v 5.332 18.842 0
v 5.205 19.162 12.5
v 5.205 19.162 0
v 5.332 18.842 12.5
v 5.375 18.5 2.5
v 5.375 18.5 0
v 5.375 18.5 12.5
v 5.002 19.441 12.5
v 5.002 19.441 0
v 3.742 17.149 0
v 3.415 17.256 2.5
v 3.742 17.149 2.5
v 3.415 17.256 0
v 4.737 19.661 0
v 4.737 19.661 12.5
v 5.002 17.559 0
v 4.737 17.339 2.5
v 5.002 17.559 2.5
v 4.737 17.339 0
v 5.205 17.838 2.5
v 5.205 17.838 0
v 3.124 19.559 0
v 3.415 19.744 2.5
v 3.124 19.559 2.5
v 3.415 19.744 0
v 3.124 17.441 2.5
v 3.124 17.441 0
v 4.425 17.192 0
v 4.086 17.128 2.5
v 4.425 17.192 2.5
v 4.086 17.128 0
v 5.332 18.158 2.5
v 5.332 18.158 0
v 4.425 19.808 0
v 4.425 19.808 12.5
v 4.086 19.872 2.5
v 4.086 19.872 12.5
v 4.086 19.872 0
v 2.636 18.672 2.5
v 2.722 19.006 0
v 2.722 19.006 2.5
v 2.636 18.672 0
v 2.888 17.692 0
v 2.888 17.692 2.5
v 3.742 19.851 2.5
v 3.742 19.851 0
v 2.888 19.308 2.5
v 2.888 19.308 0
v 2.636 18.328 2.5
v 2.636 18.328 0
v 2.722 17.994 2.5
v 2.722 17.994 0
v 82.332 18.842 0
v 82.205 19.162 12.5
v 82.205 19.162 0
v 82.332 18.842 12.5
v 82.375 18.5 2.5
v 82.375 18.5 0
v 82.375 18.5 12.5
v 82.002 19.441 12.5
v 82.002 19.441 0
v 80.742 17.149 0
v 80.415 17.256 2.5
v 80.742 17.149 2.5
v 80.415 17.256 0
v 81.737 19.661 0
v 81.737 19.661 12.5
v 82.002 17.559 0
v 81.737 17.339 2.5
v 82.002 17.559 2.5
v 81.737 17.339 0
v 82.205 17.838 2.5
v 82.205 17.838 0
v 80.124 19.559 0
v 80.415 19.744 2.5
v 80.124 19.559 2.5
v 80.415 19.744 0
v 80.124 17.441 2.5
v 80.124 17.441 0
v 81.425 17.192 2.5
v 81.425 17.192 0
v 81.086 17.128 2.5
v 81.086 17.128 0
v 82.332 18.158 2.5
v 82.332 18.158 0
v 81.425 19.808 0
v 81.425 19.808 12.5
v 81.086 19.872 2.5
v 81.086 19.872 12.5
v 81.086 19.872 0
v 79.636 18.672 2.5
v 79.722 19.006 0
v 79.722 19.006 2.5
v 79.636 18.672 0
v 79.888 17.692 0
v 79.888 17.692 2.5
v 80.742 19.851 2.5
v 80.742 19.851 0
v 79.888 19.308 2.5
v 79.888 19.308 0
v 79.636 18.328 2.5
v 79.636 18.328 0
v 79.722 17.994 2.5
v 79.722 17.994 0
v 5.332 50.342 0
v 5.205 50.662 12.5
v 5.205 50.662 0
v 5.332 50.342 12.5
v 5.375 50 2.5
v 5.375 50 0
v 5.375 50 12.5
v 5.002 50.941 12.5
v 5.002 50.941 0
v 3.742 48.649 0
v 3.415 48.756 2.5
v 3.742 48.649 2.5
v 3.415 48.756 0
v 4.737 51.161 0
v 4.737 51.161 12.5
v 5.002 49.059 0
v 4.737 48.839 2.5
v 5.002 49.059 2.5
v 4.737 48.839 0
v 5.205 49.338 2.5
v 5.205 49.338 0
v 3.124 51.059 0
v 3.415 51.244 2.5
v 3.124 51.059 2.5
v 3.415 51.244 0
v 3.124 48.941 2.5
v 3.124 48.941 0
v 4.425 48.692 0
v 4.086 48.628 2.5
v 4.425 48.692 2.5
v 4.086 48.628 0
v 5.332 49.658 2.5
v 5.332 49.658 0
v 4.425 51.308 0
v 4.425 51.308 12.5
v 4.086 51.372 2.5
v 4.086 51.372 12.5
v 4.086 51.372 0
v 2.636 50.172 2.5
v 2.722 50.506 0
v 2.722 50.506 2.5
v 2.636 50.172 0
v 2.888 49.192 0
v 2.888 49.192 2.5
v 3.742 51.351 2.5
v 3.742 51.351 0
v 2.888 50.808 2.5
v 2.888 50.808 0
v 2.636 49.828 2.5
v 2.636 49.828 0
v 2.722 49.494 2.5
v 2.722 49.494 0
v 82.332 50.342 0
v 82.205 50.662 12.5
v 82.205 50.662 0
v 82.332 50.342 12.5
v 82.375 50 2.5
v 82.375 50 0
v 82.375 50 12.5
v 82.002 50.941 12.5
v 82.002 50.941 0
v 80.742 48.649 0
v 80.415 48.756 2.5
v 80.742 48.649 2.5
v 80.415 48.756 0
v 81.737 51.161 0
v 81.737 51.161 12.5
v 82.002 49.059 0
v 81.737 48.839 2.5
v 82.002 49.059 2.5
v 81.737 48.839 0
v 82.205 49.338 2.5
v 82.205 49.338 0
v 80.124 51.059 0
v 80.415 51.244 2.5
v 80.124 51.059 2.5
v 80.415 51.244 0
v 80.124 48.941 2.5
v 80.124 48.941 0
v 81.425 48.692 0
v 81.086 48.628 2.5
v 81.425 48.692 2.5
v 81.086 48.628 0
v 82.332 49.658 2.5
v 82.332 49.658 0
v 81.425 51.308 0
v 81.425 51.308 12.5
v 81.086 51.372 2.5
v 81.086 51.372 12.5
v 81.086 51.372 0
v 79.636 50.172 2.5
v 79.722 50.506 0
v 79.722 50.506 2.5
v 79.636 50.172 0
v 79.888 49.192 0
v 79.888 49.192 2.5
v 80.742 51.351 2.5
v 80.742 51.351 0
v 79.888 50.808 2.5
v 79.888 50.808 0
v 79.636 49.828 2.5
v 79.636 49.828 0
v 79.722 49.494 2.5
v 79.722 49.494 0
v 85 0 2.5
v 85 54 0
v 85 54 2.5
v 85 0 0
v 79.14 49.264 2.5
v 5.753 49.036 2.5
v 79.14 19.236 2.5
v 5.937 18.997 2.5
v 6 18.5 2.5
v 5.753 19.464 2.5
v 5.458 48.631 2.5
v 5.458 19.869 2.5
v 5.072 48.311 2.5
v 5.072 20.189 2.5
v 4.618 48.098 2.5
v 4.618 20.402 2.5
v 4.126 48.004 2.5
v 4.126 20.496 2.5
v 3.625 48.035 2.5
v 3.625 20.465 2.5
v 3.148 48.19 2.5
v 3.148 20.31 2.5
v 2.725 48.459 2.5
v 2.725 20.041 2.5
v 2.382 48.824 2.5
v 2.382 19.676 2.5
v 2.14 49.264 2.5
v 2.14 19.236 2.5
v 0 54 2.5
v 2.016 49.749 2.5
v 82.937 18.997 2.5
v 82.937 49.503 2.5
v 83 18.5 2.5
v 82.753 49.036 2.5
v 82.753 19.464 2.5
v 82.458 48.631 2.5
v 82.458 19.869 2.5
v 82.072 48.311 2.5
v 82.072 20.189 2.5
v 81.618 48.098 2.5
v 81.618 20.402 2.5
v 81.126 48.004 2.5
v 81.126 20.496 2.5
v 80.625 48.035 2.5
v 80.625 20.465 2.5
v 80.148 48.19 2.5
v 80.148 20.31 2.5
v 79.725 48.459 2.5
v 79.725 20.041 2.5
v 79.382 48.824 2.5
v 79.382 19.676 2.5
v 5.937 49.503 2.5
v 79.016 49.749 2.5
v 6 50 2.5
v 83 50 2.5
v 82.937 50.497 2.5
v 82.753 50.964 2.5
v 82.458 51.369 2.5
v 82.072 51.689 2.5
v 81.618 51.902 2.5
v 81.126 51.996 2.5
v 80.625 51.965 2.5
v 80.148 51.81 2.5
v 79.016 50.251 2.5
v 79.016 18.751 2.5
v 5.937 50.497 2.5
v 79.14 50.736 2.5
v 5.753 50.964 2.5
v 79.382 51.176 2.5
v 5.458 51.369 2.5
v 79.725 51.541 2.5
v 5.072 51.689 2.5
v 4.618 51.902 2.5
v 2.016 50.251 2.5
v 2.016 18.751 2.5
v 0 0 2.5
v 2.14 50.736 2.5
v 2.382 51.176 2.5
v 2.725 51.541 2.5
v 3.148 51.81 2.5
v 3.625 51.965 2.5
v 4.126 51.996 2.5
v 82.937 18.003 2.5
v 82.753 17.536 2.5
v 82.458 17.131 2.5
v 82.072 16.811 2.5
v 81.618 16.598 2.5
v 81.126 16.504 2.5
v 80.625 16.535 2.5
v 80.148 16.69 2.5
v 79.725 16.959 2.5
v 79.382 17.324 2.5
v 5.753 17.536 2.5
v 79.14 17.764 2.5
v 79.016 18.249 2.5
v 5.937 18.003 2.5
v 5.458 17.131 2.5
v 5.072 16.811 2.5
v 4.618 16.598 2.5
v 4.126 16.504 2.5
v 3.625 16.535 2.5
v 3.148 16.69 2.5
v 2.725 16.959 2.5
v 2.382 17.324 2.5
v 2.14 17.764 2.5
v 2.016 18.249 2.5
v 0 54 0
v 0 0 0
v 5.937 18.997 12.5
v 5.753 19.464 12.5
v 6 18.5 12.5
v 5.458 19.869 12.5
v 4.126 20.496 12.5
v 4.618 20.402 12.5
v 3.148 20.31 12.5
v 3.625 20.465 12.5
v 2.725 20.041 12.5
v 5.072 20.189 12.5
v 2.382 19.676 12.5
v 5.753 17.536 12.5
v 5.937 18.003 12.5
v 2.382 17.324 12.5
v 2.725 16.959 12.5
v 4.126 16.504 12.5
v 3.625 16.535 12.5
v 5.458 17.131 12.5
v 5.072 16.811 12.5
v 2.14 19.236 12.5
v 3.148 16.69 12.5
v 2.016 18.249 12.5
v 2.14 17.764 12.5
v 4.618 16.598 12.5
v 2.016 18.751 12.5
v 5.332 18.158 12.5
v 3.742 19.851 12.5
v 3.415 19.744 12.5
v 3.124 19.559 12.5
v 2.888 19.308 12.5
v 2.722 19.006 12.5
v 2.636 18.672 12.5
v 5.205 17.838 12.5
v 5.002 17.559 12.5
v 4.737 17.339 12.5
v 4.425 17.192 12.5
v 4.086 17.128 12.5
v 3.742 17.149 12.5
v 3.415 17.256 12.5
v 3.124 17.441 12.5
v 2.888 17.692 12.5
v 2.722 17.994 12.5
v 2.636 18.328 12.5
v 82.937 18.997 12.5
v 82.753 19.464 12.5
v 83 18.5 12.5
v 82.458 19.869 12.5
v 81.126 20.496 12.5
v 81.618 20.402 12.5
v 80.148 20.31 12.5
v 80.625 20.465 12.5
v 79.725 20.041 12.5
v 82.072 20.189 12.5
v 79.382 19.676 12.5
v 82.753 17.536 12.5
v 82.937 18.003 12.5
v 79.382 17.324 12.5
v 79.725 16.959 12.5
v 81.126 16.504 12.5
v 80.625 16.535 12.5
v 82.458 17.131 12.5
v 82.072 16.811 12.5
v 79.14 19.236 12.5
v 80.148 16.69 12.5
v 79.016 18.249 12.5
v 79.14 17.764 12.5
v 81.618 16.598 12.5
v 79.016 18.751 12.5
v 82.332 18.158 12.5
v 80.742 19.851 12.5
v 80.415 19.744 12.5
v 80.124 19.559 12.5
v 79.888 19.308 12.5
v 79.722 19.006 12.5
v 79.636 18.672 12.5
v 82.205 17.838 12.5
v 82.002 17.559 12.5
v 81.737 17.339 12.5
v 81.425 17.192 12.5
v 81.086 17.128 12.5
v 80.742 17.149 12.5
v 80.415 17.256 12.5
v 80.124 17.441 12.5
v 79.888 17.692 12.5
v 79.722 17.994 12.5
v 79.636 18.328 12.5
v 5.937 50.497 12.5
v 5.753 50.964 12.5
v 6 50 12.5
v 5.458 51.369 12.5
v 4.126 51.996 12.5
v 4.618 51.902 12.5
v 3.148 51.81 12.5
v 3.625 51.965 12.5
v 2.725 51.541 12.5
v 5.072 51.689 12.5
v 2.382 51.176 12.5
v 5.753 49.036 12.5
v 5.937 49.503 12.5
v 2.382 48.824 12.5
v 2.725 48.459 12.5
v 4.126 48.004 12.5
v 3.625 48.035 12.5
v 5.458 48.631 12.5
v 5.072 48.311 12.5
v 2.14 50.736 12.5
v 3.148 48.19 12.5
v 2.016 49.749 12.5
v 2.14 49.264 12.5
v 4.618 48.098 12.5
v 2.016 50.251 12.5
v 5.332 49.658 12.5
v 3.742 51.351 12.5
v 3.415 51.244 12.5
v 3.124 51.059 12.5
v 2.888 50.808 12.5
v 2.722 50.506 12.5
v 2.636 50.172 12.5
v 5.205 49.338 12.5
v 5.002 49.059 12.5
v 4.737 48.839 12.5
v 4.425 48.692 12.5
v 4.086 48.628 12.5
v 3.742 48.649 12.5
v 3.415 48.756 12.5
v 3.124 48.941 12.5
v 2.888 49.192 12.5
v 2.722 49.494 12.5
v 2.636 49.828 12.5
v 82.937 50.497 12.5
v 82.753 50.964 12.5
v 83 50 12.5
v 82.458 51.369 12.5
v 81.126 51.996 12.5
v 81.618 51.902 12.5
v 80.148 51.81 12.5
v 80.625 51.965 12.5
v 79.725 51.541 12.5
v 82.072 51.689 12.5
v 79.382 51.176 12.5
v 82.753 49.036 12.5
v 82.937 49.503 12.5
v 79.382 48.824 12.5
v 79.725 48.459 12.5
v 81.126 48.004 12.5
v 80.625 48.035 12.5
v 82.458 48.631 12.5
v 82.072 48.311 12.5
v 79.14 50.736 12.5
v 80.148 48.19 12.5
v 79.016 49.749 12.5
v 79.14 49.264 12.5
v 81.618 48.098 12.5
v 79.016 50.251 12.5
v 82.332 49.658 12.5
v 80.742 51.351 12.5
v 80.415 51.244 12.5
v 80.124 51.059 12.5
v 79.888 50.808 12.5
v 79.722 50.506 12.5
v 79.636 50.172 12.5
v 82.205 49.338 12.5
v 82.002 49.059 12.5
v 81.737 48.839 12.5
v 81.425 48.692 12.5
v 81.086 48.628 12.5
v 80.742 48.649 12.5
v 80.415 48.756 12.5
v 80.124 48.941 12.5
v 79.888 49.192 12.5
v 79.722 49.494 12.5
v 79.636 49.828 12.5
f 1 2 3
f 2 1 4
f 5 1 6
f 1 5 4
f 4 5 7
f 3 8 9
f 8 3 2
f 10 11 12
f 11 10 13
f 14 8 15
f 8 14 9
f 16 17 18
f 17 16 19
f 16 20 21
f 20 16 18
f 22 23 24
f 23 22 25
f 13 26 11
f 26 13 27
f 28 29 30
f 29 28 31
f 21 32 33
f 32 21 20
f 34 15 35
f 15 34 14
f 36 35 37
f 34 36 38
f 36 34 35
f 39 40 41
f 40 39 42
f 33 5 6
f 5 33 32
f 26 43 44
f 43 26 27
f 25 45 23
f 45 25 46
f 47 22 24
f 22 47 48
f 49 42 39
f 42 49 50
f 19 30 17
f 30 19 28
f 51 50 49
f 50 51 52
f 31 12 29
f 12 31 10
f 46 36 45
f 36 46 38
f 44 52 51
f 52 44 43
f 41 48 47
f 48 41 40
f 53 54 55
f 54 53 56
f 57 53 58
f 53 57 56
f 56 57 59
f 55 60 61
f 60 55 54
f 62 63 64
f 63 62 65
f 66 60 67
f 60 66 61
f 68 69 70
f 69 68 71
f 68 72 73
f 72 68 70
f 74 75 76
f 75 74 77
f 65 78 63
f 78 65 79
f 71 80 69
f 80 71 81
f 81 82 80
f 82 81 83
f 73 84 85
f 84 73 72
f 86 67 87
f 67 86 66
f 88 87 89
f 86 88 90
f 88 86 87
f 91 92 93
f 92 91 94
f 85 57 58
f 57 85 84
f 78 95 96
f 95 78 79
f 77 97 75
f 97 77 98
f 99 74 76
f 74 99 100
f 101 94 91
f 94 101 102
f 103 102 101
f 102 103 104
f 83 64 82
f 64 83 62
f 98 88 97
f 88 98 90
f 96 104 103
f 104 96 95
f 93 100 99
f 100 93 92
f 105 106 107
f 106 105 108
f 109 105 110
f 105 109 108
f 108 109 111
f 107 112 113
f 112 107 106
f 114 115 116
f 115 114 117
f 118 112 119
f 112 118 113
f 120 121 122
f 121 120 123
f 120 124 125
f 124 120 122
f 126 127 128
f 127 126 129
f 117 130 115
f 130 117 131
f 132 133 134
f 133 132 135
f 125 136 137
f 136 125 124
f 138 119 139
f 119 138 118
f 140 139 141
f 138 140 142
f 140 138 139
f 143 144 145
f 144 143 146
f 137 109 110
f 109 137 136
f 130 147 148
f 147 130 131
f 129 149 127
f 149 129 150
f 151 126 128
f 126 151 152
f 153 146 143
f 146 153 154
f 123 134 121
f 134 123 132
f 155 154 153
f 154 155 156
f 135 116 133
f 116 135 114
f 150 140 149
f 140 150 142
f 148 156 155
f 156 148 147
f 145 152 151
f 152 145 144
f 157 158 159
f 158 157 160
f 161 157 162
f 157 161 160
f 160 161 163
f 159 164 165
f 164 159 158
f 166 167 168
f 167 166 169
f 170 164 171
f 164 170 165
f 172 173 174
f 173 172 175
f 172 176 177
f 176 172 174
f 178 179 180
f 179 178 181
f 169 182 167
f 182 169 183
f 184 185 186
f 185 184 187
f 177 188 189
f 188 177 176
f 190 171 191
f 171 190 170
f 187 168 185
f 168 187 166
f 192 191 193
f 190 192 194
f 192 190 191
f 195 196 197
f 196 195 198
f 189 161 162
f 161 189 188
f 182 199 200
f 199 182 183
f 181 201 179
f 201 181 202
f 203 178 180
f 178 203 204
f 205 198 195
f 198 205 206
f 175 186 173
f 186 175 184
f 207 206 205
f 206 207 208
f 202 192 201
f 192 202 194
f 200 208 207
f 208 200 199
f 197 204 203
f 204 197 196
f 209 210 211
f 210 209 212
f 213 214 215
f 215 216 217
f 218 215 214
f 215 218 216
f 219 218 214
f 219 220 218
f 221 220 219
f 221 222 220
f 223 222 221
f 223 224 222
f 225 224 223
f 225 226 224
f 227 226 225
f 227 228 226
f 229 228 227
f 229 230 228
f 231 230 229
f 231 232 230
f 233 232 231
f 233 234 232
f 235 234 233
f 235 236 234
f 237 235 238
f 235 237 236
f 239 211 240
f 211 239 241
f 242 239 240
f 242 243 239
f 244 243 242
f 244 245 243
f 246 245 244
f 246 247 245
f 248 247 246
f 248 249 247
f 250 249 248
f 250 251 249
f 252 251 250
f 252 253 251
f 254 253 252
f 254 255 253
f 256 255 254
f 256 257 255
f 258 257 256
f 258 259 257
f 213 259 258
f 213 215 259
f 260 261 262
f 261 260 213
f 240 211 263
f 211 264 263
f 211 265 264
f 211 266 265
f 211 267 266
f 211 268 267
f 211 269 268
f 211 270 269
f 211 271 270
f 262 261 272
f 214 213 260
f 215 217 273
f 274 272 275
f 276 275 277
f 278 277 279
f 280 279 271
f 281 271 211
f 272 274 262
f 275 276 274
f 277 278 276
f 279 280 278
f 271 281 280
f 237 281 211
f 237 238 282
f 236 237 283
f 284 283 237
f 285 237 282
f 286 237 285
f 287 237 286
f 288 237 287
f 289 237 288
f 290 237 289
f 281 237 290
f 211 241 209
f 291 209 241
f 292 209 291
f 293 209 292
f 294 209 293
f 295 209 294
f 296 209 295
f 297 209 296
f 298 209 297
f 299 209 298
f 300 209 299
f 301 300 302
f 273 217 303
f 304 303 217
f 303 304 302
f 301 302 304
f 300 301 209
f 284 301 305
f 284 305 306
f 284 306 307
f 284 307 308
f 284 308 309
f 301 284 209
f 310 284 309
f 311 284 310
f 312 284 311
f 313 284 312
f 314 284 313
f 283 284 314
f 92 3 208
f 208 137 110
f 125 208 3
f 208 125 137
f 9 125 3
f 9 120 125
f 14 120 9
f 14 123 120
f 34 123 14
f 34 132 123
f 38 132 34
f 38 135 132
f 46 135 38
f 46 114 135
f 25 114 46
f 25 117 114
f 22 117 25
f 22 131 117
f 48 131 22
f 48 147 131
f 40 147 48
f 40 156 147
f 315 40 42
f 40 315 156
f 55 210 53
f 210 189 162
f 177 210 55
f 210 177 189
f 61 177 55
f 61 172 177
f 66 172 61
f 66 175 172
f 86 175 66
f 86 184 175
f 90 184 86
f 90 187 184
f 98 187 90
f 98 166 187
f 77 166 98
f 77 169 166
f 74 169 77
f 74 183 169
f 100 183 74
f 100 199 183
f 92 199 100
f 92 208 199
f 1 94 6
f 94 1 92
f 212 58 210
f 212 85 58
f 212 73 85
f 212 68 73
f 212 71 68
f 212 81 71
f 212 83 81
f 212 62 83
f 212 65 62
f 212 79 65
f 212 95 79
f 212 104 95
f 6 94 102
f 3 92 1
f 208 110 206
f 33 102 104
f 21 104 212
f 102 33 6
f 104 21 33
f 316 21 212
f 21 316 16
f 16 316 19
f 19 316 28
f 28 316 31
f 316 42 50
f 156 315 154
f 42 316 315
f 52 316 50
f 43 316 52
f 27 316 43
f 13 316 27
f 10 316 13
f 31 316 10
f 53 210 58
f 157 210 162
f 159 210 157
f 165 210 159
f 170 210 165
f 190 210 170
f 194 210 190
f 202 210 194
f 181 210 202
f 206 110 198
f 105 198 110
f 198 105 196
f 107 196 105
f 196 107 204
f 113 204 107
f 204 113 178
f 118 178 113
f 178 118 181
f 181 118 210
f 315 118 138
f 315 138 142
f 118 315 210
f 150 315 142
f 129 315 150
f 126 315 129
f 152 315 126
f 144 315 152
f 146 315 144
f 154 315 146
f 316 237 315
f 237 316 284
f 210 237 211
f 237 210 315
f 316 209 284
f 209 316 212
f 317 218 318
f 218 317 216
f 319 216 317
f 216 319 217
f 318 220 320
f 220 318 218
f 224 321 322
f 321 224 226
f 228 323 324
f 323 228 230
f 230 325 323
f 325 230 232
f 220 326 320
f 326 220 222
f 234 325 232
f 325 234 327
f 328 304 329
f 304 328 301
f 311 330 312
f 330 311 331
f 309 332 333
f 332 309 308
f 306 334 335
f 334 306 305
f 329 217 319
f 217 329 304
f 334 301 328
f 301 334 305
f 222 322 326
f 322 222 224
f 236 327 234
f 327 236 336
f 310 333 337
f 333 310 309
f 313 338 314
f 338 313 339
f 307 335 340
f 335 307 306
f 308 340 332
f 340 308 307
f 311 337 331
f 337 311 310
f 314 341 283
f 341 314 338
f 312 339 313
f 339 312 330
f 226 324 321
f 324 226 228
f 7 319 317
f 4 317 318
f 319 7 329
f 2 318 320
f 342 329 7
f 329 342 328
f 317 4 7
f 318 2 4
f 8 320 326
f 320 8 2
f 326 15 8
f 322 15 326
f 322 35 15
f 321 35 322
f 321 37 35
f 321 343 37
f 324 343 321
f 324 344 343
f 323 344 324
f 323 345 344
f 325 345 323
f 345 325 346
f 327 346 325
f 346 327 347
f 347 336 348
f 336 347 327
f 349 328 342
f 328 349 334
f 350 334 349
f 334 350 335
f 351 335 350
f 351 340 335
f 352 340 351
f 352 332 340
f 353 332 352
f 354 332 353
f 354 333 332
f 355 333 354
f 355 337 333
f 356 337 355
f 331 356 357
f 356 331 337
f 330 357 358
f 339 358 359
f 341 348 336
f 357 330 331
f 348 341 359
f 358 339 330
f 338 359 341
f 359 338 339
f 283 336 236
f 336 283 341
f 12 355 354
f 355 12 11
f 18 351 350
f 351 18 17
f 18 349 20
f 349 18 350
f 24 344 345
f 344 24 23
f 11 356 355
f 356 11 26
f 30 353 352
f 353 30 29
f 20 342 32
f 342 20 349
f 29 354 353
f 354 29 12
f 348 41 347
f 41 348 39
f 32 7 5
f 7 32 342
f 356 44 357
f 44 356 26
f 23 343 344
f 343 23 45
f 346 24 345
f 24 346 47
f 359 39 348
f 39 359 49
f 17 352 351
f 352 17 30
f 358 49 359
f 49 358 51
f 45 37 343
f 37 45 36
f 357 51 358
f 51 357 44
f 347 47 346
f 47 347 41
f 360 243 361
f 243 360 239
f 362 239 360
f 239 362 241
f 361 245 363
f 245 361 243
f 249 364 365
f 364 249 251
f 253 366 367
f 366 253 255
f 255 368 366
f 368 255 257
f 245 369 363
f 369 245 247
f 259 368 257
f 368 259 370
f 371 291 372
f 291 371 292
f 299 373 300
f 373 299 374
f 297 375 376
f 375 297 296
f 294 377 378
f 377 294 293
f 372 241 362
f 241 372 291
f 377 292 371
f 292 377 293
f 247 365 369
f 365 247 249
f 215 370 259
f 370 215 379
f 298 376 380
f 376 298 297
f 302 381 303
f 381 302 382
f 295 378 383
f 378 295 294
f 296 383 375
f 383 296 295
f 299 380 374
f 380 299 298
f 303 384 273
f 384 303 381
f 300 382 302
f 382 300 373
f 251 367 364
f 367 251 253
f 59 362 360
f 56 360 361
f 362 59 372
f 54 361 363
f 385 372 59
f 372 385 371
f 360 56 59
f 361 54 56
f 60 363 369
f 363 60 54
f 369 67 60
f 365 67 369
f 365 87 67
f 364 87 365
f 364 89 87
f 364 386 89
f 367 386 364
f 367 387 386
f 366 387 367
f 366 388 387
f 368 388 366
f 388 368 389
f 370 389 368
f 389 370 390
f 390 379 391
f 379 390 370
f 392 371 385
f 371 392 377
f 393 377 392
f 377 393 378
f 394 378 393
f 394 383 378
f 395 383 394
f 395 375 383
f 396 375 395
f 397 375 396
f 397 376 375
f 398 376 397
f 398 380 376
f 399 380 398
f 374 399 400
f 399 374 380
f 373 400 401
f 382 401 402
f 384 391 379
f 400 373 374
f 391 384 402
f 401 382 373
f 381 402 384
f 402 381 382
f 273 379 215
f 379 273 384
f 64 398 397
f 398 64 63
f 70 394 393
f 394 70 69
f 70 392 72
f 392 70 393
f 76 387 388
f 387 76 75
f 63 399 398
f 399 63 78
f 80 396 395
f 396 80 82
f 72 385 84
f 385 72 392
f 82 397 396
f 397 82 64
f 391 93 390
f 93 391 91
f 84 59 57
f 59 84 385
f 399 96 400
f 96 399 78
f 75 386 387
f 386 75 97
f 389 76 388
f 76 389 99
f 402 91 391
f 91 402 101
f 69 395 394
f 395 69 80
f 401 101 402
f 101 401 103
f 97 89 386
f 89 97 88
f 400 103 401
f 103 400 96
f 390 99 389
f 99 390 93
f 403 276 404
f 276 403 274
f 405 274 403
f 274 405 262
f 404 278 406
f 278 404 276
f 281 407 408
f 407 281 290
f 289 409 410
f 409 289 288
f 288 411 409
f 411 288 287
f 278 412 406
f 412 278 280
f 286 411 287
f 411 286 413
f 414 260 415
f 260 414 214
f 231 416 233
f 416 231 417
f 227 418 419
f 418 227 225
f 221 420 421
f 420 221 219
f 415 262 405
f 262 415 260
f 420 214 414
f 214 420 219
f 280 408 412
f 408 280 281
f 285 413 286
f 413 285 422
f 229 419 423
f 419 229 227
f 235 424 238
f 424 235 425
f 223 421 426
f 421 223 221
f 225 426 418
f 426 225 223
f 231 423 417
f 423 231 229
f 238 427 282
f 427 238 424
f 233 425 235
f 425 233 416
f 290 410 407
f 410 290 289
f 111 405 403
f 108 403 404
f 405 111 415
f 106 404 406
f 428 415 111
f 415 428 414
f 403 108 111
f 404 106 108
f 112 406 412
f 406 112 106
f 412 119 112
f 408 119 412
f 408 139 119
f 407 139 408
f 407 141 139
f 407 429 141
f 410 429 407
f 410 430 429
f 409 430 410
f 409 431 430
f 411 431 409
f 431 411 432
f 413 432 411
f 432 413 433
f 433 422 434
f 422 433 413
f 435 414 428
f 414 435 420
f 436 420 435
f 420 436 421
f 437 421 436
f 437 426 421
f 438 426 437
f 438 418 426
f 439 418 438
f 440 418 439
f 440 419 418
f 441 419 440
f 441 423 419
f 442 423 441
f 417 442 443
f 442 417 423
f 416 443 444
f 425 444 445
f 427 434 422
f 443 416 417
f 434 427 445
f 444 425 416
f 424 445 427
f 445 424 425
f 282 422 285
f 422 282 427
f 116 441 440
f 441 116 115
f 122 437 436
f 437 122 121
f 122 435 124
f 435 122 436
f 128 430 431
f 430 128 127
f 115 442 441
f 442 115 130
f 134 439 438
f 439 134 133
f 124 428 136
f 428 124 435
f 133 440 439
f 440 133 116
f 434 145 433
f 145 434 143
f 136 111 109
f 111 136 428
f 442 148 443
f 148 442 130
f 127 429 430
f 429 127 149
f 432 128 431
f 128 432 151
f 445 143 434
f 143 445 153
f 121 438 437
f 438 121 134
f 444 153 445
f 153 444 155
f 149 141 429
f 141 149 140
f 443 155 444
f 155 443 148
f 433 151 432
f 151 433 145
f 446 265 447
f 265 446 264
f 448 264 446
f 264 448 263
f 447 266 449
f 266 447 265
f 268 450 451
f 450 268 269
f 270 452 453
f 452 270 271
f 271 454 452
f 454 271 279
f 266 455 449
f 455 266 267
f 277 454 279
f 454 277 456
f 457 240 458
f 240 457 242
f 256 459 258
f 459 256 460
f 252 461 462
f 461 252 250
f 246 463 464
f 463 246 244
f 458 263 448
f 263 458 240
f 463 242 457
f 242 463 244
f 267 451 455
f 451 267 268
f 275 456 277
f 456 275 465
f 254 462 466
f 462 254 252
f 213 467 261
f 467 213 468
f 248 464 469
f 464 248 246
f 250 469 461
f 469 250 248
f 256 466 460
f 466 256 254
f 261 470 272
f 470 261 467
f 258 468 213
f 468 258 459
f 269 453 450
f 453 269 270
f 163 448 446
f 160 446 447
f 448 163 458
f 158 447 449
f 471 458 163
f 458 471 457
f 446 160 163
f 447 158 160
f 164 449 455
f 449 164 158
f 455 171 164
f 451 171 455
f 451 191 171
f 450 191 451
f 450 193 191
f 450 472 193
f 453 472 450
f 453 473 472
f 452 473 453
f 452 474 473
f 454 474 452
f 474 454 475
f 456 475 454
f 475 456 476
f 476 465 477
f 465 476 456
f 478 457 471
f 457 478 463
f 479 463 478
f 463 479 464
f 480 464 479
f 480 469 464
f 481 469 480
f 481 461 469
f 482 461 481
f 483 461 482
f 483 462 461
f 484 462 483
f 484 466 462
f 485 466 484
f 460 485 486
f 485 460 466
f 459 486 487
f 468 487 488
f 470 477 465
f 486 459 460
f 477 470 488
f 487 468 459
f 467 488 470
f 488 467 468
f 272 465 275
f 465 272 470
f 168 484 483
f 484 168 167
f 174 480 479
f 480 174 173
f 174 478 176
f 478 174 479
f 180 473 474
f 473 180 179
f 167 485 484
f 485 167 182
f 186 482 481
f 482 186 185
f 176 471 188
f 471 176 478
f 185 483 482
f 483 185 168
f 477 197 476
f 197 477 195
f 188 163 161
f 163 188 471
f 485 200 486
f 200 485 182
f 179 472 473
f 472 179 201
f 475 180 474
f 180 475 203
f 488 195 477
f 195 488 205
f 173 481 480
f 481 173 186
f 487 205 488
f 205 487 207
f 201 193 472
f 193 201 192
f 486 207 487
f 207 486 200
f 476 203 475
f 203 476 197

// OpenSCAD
// file: dimensions.scad
case_width = 85;
case_height = 54;

// M2.5 Screw Holes
screw_hole_clearance = 2.75;
screw_head_width = 5;
screw_standoff_width = 4;

// Screw Hole Position
bottom_left_screw_center_origin = [4, 18.5];
bottom_right_screw_center_origin = [81, 18.5];
top_left_screw_center_origin = [4, 50];
top_right_screw_center_origin = [81, 50];

// case thickness
case_thickness = 2.5;
// main file
include <dimensions.scad>;

module base() {
  cube(
    size=[
      case_width,
      case_height,
      case_thickness
    ]
  );
}

module hole_puncher(height = 10) {
  cylinder(
    $fn = 25,
    h = height,
    r = screw_hole_clearance / 2,
    center = true
  );
}

module hole_tube(height = 10) {
  cylinder(
    $fn = 25,
    h = height,
    r = screw_standoff_width / 2,
    center = true
  );
}

module screw_hole_punchers() {
  translate(bottom_left_screw_center_origin) hole_puncher();
  translate(bottom_right_screw_center_origin) hole_puncher();
  translate(top_left_screw_center_origin) hole_puncher();
  translate(top_right_screw_center_origin) hole_puncher();
}

module base_with_holes() {
  difference() {
    base();
    screw_hole_punchers();
  }
}

module standoff(height = 10) {
  translate([0, 0, height / 2]) difference() {
    hole_tube(height);
    hole_puncher(height + 1);
  }
}

module screw_hole_standoffs(height = 10) {
  translate(concat(bottom_left_screw_center_origin, case_thickness)) standoff();
  translate(concat(bottom_right_screw_center_origin, case_thickness)) standoff();
  translate(concat(top_left_screw_center_origin, case_thickness)) standoff();
  translate(concat(top_right_screw_center_origin, case_thickness)) standoff();
}

module base_with_legs() {
  union() {
    base_with_holes();
    screw_hole_standoffs();
  }
}

// module round_corner(size = 3, height=10, bottom=true, left=true) {
//   half = size / 2;
//   slice_size = 0.1 + half;
//   difference() {
//     difference() {
//       cube(size=[size, size, height]);
//       translate([half, half]) cylinder($fn = 50, r = half, h = height + .1);
//     }
//     translate([-0.0001 + half, -0.0001]) cube(size=[slice_size, slice_size, height + .2]);
//     translate([-0.0001, half]) cube(size=[slice_size, slice_size, height + .2]);
//     translate([half, half + 0.0001]) cube(size=[slice_size, slice_size, height + .2]);
//   }
// }

// difference() {
//   round_corner(height=10.1);
//   cube(size=[1.6, 1.6, 10]);
// }

base_with_legs();
